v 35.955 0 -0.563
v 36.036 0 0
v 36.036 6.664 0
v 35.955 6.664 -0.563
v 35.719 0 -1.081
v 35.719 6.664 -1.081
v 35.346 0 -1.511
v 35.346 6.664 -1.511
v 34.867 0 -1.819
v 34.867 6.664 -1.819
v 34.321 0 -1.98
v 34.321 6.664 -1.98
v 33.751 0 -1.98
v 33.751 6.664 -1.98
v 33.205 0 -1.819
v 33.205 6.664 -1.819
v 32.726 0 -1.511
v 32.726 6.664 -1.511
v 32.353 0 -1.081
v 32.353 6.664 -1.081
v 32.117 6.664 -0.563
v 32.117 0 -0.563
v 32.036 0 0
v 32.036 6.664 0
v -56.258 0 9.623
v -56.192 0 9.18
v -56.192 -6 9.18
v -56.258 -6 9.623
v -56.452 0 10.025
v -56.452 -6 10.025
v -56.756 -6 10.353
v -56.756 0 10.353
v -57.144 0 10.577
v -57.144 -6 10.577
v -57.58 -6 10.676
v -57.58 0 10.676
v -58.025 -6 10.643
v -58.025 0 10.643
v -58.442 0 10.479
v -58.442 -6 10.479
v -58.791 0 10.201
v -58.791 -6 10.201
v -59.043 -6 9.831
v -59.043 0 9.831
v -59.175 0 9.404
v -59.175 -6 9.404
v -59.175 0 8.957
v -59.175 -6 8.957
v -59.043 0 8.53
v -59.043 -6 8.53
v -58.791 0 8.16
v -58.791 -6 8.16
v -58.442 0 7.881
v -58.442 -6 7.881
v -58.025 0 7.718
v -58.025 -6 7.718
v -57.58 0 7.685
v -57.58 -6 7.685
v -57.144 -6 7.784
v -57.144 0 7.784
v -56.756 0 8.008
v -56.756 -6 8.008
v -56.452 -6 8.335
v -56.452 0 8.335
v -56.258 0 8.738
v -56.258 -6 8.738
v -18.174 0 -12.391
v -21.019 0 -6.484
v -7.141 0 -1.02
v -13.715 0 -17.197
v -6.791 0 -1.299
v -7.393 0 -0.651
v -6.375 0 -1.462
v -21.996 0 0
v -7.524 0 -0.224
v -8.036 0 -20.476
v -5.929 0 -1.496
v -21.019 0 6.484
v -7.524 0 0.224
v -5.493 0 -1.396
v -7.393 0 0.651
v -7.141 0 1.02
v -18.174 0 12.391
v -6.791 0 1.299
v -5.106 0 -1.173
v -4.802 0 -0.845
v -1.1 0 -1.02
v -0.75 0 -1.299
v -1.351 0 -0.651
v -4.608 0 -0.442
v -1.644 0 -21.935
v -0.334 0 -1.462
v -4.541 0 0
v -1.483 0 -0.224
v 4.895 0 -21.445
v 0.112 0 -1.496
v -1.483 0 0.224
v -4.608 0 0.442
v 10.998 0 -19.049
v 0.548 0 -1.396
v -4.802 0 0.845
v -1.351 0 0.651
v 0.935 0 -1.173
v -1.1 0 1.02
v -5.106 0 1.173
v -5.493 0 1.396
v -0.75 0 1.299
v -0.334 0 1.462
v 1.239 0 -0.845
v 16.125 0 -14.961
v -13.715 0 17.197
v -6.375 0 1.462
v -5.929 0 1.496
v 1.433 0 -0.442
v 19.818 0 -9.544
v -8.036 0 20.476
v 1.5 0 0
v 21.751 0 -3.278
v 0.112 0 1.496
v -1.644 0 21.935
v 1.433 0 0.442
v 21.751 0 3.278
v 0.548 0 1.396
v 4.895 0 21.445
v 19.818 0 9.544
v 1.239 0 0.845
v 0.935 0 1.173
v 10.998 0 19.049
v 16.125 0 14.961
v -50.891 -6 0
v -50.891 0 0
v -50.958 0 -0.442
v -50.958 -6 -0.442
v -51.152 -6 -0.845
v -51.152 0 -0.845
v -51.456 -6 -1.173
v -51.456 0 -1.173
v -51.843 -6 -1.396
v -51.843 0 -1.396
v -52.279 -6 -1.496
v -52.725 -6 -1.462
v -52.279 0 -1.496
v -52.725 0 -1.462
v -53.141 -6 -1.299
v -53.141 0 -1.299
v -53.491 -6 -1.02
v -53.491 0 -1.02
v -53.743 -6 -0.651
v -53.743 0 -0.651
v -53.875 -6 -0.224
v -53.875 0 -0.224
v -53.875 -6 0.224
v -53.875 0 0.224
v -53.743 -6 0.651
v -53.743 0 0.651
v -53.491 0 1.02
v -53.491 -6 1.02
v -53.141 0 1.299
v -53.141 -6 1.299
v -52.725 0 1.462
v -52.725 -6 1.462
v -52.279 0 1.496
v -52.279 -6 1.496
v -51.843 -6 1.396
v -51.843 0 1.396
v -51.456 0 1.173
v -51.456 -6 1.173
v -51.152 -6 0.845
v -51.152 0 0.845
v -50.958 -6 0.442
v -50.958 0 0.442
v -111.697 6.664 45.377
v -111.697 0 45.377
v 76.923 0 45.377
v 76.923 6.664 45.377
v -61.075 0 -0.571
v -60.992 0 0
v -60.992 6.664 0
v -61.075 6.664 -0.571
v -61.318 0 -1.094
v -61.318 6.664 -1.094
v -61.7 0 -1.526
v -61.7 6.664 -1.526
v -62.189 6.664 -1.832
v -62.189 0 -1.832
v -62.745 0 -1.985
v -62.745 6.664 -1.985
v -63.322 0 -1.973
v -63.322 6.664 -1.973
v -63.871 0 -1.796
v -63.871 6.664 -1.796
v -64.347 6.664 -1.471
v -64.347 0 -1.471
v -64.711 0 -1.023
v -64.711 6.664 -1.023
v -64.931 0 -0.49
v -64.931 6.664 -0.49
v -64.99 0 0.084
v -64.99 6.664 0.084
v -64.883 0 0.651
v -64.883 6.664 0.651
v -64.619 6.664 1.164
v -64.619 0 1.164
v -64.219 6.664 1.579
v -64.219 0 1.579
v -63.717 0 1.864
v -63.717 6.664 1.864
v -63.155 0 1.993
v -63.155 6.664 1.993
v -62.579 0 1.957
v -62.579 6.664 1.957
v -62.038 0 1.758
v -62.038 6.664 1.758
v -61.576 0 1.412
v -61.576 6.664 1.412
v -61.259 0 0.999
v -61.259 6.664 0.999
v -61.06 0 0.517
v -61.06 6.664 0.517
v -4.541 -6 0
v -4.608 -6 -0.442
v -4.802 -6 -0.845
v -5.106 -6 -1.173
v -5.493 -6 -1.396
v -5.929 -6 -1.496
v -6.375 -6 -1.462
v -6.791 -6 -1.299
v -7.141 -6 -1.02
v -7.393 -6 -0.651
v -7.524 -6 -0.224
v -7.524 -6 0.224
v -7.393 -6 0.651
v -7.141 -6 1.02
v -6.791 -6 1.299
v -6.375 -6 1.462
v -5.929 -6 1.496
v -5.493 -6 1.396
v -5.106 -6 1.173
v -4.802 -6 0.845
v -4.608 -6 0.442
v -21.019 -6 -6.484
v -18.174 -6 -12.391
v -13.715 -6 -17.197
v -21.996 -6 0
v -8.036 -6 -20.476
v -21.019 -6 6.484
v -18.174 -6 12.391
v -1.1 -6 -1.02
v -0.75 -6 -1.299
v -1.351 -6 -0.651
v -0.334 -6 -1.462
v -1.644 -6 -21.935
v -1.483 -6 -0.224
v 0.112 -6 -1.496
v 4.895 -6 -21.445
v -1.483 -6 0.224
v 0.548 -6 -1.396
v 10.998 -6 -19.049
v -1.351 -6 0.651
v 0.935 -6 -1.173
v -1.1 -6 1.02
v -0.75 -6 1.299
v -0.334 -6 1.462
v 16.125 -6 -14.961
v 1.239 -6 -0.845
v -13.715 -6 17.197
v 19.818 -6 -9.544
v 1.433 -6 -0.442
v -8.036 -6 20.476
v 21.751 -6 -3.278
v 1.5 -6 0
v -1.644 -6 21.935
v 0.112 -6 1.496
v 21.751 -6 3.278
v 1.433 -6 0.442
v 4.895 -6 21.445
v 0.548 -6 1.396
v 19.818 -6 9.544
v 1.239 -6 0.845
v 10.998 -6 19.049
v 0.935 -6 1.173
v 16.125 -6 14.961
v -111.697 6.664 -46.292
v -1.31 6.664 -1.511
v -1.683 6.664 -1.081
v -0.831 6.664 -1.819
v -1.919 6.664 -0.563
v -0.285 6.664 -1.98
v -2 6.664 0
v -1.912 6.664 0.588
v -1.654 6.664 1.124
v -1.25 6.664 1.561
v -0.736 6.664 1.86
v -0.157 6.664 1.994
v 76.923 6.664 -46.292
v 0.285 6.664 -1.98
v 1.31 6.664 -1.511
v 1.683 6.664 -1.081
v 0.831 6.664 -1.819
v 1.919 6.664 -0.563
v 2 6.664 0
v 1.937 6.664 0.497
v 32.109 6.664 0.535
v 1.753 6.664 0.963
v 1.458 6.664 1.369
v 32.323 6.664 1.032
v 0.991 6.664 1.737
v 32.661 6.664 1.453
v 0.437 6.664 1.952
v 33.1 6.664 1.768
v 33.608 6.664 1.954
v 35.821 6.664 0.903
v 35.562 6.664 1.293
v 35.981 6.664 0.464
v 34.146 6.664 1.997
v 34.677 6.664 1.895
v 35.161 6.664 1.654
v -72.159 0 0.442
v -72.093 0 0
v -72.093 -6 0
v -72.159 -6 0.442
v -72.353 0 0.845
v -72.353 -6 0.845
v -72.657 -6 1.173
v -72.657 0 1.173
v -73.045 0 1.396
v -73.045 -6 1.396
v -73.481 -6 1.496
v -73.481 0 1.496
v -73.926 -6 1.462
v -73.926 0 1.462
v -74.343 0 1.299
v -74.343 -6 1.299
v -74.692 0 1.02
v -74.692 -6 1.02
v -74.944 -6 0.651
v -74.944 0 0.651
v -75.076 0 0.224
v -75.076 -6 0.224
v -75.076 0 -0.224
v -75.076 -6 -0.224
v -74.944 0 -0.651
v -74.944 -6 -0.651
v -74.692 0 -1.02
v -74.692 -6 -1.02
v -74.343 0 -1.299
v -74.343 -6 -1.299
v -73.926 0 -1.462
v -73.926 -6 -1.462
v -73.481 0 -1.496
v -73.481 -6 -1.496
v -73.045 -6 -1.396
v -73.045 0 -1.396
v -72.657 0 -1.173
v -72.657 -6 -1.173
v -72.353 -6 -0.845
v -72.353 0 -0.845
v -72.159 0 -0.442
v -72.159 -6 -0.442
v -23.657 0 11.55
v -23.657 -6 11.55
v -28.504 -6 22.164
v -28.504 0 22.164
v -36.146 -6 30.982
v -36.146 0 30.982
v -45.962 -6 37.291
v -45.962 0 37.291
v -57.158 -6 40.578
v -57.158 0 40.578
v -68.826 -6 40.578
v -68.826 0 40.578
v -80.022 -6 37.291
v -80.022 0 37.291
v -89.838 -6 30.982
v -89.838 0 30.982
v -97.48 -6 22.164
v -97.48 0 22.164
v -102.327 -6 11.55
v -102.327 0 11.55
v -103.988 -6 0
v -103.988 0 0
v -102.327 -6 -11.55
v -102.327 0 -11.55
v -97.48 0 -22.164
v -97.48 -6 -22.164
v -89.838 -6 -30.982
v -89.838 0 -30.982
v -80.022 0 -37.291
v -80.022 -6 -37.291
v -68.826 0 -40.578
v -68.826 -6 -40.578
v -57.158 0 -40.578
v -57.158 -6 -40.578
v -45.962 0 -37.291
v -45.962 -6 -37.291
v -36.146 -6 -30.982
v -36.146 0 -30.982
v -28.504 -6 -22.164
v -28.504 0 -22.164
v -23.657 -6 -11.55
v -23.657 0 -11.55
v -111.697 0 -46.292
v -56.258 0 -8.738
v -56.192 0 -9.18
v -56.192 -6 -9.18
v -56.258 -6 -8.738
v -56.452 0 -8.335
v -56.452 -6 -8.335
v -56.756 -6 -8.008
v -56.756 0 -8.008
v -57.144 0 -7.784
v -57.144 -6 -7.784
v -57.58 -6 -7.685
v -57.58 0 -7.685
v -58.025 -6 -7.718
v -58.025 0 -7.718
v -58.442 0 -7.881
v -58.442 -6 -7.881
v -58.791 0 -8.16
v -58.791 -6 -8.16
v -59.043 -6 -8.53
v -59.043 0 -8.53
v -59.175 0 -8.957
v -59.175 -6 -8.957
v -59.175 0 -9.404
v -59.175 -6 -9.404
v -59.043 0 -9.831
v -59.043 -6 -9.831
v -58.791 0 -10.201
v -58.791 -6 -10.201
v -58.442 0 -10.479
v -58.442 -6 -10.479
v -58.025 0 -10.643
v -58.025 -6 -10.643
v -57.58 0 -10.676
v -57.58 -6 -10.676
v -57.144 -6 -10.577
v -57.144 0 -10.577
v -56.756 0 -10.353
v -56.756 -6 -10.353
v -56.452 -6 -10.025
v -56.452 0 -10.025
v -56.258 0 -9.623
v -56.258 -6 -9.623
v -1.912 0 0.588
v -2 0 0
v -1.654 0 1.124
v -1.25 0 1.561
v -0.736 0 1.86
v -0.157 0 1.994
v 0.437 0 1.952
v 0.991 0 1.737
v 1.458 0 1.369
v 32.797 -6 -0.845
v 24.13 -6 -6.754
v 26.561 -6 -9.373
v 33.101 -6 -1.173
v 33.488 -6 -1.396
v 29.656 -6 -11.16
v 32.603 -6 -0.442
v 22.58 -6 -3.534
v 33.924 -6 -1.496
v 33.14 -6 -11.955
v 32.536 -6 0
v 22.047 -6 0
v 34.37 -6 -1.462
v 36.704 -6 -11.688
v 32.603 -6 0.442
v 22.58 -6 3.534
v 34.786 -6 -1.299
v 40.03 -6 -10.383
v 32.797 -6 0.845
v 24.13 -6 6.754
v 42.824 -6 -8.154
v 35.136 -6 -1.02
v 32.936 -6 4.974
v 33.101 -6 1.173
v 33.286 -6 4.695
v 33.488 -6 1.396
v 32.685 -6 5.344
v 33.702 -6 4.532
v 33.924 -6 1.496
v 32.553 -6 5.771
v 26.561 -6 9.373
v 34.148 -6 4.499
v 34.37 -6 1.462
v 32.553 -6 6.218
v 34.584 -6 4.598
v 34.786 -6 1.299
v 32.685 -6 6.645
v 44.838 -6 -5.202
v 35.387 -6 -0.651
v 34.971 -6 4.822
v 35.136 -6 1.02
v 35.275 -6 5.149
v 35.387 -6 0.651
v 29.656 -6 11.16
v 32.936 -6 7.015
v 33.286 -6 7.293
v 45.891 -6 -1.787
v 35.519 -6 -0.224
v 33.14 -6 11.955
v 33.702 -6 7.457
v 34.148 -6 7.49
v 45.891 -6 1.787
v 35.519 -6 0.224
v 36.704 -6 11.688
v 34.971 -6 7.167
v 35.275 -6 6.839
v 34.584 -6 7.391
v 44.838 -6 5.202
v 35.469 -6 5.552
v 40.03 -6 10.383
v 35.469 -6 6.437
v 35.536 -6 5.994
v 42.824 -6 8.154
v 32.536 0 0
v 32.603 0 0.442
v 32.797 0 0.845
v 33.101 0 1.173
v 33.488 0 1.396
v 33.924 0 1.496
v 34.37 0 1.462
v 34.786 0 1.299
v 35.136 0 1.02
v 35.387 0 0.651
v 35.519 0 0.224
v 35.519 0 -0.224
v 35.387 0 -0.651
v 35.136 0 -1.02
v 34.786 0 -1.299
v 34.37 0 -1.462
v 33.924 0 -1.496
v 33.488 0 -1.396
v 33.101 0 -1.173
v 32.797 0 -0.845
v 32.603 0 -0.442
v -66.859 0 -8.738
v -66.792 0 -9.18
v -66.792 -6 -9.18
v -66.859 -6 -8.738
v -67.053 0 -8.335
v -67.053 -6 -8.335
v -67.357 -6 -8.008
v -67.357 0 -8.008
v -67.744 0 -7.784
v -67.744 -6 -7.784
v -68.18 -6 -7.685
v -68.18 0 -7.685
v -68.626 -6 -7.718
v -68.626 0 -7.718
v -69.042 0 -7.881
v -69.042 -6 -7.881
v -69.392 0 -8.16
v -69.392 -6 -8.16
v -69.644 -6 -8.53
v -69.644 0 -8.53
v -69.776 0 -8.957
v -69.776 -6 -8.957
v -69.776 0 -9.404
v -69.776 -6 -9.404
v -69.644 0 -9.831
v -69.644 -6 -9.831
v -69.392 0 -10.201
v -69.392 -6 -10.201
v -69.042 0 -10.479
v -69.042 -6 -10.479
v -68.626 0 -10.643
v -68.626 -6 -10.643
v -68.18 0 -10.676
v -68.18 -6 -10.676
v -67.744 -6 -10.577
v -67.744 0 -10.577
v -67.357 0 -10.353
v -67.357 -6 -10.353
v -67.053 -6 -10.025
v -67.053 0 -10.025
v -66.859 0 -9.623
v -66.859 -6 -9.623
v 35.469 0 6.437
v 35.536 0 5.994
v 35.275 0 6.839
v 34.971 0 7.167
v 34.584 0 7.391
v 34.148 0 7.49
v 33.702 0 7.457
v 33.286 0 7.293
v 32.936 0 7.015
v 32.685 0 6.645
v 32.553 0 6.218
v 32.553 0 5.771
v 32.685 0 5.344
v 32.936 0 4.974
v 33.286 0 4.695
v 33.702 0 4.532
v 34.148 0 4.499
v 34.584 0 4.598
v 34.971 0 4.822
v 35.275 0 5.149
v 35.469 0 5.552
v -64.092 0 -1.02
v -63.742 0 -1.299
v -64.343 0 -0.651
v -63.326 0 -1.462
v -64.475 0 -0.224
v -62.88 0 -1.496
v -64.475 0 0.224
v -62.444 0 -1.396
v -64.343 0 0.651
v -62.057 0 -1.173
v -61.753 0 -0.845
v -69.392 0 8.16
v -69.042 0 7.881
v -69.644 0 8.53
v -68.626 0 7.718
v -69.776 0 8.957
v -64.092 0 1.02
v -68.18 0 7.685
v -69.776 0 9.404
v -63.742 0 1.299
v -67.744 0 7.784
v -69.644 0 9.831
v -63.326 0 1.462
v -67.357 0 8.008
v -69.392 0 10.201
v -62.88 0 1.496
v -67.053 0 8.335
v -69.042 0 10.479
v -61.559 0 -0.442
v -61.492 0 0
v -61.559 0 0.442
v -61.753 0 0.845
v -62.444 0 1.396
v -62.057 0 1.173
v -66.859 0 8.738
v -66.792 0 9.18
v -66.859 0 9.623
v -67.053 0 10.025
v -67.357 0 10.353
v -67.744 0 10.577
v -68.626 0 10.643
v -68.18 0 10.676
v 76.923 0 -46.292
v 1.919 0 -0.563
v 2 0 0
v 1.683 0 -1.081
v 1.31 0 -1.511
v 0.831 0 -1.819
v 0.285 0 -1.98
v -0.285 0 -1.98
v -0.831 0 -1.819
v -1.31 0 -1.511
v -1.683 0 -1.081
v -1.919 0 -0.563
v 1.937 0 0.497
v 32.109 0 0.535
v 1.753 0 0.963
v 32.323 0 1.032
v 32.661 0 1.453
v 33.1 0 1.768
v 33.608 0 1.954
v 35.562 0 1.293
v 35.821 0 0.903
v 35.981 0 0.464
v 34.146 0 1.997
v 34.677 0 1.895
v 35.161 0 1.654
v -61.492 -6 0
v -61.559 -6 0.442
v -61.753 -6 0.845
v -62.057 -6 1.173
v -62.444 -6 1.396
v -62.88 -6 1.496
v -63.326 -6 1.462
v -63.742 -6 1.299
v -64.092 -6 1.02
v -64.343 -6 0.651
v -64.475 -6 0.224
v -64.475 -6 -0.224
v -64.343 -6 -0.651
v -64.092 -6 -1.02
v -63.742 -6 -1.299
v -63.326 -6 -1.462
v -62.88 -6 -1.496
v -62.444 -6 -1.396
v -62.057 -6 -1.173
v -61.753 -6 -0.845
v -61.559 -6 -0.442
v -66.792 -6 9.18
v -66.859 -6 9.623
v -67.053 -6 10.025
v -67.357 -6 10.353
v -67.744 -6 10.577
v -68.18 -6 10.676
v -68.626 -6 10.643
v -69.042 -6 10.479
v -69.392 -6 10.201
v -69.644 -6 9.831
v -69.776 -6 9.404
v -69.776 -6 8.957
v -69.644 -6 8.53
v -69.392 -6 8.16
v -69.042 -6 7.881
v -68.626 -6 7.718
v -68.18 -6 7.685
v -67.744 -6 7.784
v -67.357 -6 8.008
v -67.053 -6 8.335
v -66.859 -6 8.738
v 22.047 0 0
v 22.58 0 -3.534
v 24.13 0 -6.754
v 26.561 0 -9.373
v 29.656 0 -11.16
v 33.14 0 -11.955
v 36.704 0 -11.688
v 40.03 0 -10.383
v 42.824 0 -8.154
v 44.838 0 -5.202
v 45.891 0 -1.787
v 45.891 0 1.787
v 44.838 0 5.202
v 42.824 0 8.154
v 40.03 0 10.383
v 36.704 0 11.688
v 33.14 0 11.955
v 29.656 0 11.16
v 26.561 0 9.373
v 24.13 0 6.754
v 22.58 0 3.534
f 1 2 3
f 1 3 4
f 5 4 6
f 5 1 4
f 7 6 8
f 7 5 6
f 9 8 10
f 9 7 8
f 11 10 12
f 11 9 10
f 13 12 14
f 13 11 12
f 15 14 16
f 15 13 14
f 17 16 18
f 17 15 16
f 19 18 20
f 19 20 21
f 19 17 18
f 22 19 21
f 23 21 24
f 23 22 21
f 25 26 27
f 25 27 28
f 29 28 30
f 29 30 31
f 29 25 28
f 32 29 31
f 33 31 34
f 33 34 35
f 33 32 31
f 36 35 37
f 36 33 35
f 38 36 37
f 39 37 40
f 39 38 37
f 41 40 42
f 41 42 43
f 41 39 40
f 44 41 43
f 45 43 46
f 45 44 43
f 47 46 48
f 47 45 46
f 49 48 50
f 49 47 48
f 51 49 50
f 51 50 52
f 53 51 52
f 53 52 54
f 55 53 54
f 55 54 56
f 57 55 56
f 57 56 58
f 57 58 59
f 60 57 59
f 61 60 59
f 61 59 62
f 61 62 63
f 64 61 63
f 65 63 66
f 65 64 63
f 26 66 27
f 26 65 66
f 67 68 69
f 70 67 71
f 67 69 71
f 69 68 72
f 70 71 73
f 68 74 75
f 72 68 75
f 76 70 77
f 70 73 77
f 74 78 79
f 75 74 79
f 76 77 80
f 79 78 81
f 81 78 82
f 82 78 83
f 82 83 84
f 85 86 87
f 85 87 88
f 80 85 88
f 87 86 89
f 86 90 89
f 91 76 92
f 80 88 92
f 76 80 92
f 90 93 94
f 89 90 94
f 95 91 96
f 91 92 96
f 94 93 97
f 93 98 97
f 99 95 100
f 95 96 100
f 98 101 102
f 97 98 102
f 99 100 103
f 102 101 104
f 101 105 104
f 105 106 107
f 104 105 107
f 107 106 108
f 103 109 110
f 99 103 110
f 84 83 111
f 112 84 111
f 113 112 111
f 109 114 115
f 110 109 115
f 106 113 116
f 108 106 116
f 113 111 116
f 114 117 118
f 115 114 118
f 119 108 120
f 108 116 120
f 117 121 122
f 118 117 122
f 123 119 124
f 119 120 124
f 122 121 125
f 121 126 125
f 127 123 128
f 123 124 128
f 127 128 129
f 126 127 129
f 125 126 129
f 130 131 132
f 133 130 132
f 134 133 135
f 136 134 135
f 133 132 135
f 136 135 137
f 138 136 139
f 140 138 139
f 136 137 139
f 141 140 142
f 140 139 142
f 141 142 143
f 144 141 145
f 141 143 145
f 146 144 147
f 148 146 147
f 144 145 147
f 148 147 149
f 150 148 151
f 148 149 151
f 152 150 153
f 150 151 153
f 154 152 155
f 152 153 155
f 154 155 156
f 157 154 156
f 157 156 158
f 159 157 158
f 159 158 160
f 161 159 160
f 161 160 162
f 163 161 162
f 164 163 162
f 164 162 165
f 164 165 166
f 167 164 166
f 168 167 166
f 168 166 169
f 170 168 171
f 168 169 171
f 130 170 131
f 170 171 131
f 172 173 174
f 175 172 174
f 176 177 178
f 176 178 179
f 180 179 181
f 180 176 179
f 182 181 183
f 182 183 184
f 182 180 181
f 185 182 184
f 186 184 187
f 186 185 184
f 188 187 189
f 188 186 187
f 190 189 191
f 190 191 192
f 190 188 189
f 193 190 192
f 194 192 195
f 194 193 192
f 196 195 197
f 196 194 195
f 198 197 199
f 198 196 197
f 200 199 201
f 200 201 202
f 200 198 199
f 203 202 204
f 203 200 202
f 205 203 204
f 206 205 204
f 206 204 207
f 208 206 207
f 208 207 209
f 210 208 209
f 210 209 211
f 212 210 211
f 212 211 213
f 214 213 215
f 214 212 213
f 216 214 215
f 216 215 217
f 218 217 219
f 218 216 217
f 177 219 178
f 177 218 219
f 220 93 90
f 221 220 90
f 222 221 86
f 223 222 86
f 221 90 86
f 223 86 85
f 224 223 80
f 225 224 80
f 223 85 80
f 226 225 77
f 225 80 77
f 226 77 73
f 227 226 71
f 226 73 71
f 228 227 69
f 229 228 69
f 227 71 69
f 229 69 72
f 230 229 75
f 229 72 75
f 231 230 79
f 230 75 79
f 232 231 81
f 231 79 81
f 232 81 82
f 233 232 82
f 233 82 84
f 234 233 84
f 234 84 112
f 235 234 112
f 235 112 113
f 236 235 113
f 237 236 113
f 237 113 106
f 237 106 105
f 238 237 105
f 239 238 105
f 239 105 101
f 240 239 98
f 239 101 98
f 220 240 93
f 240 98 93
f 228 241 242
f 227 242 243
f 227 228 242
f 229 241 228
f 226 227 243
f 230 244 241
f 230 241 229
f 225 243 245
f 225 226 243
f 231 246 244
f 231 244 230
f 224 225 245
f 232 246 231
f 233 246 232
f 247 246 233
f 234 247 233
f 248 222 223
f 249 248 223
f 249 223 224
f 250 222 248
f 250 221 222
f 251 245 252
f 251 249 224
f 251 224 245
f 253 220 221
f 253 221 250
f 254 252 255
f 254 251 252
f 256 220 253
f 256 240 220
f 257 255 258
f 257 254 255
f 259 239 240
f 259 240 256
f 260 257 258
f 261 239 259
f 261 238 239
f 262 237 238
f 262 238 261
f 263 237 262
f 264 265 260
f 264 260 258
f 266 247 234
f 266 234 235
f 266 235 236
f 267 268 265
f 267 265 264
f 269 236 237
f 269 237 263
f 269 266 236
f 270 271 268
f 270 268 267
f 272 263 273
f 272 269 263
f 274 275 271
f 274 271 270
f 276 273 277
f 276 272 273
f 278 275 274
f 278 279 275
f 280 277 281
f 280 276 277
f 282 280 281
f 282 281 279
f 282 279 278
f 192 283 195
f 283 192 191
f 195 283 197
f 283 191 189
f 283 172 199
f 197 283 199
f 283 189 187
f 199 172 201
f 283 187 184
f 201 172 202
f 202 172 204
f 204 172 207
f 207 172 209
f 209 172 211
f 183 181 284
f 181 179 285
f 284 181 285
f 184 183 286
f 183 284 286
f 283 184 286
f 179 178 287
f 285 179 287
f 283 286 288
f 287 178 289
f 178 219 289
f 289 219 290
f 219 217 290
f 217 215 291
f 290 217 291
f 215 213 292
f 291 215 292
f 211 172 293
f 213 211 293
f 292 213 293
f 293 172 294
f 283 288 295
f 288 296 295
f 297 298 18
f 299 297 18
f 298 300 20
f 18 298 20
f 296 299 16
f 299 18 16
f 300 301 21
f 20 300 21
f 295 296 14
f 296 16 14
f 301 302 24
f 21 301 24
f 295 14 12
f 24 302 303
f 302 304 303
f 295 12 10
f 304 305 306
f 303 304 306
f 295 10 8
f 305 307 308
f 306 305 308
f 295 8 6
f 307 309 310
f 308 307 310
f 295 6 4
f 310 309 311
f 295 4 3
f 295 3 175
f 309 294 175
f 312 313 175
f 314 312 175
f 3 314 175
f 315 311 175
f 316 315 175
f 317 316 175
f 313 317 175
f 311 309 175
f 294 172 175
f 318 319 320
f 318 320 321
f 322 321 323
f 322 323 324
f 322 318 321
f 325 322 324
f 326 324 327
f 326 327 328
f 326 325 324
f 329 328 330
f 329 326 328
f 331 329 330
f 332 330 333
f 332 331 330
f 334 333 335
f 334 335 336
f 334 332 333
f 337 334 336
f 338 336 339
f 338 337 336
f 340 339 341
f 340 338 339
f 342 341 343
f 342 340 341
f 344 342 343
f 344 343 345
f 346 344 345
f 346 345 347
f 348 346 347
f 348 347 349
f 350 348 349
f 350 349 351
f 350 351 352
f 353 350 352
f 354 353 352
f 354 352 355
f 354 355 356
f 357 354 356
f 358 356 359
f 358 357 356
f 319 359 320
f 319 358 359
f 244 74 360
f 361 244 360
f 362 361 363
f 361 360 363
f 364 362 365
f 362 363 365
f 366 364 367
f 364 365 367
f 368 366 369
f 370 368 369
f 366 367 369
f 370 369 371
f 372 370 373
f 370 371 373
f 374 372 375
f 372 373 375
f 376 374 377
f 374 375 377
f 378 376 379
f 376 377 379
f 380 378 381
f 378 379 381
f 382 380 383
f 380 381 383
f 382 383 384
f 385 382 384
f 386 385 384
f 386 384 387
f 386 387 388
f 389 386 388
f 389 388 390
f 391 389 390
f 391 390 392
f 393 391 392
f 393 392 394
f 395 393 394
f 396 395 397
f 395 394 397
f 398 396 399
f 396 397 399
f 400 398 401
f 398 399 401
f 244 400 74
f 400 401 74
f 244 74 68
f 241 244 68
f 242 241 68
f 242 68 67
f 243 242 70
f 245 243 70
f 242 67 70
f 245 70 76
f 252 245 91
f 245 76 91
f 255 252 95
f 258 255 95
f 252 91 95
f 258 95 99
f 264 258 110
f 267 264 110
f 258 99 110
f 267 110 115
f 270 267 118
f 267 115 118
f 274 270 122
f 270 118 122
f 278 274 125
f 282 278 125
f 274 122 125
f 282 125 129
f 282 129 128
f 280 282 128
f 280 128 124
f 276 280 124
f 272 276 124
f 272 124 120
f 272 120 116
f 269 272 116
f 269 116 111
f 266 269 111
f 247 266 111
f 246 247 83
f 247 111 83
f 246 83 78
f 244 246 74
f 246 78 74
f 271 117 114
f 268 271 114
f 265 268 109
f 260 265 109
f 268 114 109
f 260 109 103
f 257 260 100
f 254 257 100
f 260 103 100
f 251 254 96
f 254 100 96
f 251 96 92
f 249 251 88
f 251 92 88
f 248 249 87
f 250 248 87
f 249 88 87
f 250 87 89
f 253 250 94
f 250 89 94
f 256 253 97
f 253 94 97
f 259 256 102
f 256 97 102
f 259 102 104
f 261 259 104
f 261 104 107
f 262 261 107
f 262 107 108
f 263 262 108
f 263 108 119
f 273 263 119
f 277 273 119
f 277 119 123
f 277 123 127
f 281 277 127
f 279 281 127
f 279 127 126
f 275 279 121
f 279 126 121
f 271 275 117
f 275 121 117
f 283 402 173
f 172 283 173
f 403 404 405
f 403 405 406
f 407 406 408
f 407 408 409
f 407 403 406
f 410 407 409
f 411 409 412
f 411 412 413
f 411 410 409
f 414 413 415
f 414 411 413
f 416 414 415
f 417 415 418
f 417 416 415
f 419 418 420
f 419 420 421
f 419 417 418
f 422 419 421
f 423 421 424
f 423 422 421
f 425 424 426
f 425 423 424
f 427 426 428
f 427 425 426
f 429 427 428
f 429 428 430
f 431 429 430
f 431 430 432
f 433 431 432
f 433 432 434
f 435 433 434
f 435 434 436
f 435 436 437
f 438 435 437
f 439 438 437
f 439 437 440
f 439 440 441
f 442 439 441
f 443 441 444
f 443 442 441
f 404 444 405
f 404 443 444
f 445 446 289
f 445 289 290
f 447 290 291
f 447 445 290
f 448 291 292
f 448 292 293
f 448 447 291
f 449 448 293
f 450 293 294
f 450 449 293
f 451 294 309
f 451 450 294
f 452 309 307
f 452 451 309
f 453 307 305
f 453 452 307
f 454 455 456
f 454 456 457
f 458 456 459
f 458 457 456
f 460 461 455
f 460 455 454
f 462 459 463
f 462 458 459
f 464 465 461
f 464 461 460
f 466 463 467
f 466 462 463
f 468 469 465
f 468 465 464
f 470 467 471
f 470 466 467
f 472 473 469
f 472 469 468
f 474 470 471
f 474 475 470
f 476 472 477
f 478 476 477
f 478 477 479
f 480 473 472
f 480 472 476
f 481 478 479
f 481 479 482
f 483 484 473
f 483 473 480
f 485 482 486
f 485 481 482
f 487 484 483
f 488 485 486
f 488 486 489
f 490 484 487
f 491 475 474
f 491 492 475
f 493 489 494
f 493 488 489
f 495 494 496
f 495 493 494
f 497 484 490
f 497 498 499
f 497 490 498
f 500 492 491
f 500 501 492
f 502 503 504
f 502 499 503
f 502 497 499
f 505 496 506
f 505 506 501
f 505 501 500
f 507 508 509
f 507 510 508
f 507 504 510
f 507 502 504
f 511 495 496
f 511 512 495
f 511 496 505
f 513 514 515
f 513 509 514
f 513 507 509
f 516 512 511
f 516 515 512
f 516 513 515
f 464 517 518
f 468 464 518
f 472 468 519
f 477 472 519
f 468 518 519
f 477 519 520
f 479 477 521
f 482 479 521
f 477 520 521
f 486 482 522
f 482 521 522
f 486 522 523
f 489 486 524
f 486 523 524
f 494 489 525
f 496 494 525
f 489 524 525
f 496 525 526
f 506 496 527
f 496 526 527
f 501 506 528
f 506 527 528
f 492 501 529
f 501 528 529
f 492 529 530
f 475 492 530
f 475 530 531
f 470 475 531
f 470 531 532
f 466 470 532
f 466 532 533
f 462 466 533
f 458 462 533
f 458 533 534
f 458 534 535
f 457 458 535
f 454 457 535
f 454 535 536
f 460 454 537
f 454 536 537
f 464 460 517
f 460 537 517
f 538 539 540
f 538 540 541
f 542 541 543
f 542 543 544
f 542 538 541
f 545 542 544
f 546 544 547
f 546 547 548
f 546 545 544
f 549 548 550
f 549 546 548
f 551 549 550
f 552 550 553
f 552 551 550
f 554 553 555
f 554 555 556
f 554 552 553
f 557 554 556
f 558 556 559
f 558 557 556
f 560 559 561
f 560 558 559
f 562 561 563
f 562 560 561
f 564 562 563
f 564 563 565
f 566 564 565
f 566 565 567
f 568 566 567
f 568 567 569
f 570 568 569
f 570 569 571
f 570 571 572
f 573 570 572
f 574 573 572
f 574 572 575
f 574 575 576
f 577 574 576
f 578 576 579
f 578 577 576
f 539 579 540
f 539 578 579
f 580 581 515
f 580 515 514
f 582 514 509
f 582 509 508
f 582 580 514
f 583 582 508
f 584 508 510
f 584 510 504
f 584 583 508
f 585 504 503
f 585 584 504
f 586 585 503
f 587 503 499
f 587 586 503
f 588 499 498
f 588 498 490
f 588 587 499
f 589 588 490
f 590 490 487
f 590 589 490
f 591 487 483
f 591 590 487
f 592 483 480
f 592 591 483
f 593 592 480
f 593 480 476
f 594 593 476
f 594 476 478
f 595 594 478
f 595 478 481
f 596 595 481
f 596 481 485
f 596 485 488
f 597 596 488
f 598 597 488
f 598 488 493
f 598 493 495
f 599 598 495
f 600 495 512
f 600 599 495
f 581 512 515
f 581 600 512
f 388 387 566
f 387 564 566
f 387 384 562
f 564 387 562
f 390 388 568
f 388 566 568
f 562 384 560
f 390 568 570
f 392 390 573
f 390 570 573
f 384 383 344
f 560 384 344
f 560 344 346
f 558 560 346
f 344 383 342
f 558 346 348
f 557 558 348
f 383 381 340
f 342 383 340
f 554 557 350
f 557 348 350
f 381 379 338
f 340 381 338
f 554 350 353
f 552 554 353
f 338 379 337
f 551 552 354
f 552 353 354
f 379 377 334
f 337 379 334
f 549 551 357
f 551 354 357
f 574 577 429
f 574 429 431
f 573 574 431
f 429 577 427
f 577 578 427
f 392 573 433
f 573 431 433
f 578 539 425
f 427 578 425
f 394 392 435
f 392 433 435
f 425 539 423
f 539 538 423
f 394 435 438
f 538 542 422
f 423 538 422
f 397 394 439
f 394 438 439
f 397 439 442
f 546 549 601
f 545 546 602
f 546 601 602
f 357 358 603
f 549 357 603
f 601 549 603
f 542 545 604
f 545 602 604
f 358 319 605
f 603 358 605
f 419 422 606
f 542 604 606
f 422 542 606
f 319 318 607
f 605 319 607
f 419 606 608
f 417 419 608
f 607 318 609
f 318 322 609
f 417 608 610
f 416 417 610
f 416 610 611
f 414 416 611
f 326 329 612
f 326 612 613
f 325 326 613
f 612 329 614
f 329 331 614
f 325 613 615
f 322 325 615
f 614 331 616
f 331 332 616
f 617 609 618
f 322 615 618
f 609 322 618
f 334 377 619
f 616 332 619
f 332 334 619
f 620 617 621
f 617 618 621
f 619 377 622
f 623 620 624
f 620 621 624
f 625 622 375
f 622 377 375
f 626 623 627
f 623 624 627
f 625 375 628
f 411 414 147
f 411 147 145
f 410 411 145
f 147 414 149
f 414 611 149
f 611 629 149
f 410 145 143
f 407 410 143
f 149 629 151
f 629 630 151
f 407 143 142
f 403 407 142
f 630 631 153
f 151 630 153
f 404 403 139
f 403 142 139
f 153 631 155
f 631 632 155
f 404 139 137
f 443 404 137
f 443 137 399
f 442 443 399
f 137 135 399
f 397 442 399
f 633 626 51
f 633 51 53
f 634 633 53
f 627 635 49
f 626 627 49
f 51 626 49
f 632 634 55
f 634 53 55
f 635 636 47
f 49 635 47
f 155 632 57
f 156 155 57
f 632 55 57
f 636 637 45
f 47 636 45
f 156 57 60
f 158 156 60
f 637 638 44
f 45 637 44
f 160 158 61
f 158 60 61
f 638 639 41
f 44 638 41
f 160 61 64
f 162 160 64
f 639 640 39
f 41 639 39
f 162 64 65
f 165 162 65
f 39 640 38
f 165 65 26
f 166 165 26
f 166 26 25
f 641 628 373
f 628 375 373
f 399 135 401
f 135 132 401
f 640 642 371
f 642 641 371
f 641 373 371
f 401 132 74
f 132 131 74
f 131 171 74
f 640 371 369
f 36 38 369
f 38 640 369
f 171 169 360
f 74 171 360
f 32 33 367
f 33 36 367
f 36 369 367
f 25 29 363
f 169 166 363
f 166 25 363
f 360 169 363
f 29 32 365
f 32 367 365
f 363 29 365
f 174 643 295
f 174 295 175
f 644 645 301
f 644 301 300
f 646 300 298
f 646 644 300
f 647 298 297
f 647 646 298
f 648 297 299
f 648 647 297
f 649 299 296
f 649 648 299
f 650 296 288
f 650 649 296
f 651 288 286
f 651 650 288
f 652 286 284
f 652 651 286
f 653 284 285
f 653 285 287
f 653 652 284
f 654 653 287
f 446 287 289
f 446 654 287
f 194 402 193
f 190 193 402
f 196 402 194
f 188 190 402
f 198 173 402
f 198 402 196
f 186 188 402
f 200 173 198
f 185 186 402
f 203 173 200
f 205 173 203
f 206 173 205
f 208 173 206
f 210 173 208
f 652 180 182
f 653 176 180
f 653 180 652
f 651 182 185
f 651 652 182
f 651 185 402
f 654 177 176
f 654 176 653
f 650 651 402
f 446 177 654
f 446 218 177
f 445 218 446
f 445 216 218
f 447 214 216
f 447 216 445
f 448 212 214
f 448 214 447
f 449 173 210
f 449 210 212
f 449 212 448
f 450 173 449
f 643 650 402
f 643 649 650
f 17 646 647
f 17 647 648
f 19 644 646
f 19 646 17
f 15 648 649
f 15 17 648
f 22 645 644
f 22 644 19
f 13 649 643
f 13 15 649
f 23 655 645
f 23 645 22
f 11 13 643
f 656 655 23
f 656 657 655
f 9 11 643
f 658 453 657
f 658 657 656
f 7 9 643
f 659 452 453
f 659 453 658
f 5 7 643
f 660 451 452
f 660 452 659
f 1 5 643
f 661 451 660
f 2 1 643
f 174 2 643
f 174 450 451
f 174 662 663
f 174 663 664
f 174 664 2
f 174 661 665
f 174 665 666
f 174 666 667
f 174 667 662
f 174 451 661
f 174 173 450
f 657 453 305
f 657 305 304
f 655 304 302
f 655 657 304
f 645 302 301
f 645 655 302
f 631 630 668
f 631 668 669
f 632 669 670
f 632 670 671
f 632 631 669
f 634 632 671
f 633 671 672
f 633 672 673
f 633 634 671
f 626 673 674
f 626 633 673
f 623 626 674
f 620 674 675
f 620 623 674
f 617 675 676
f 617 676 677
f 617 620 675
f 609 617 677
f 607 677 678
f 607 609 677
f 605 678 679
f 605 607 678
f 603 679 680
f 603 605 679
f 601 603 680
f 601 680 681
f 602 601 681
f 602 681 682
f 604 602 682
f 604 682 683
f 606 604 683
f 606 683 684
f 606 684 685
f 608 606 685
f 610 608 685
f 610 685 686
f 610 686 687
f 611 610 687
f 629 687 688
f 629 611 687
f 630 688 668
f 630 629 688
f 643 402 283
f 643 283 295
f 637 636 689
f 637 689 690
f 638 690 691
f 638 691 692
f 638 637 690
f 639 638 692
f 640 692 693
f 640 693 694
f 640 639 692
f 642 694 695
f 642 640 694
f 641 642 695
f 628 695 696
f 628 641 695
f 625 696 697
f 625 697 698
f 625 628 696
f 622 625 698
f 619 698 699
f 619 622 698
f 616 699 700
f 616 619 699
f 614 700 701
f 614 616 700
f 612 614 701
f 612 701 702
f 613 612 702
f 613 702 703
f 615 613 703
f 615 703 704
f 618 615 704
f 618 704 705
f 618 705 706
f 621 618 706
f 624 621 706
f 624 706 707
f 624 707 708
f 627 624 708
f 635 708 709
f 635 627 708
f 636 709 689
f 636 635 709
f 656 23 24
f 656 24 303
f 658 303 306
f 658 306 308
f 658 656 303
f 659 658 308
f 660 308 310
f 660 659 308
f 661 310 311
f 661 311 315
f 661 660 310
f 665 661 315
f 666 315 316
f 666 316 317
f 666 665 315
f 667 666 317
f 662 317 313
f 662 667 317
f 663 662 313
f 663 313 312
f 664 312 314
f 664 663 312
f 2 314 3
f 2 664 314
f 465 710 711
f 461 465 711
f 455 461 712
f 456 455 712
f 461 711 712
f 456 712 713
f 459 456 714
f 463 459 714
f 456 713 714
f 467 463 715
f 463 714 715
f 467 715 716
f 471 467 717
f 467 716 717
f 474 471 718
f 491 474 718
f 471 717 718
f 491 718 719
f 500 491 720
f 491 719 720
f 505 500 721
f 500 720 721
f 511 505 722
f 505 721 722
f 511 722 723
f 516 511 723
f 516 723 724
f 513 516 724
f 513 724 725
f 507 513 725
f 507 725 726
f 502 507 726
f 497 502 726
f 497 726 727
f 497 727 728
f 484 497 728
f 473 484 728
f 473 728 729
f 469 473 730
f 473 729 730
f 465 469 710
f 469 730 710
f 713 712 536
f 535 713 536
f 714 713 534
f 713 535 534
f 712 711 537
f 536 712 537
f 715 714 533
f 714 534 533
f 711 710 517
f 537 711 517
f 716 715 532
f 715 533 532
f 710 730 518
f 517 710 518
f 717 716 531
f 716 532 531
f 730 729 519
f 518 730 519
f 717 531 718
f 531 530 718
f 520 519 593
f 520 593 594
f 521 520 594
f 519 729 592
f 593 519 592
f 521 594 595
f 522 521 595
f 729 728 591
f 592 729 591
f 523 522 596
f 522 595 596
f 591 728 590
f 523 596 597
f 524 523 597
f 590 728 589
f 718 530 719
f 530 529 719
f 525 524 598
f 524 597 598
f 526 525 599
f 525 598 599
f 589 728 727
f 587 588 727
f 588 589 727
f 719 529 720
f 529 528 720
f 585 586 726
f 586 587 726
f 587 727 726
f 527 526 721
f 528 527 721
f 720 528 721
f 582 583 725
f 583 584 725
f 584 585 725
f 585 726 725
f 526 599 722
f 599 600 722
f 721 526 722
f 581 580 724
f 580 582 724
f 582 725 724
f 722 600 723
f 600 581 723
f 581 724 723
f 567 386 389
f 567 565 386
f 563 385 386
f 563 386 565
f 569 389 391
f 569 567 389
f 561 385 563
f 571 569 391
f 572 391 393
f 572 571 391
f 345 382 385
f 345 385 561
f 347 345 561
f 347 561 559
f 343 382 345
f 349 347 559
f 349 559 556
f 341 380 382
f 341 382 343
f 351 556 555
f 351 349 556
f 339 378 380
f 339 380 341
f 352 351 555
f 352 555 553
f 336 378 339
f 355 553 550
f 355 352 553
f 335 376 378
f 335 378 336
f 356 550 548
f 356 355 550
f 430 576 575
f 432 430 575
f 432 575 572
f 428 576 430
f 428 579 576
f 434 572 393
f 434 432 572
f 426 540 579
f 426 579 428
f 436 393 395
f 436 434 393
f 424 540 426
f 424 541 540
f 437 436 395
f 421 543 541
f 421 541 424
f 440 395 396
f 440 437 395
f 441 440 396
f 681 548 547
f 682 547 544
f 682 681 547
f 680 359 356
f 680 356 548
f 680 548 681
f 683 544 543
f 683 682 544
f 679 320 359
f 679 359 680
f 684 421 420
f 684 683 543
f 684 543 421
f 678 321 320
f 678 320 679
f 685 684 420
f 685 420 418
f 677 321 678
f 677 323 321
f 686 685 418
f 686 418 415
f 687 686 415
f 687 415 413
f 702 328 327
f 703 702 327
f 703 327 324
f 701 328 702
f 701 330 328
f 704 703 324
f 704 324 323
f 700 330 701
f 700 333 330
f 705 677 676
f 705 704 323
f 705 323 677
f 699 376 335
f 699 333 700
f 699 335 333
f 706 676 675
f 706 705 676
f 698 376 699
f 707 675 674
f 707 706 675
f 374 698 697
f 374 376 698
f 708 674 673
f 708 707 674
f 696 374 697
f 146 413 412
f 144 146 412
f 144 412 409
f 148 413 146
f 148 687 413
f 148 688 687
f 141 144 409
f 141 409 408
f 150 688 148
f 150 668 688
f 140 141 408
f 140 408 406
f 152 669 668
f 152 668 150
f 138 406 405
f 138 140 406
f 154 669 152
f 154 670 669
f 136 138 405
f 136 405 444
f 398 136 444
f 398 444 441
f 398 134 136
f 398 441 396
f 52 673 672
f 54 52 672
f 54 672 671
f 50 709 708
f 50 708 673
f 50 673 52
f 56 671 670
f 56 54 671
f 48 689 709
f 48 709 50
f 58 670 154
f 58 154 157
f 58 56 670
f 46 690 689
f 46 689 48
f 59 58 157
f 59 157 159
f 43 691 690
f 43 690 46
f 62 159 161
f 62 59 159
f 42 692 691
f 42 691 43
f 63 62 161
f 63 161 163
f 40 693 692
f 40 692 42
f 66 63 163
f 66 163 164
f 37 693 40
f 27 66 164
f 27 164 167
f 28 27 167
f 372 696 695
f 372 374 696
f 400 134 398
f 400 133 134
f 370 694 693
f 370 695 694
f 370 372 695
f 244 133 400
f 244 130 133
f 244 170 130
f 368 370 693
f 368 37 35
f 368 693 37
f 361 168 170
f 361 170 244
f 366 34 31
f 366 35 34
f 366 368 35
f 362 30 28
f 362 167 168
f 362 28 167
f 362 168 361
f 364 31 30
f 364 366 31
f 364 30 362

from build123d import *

# Parameters (mm, degrees)
F0_R     = 40.9956
F0_R_2   = 1.5
F1_DEPTH = 6
F2_W     = 188.6204481125
F2_H     = 91.6689150035
F3_DEPTH = 6.66401


with BuildPart() as f1:
    # F0 (on Front) → F1 (new body)
    with BuildSketch(Plane.XZ):
        with Locations((-62.992, 0)):
            Circle(F0_R)
        with Locations((-68.2923400796, -9.1804582301)):
            Circle(F0_R_2, mode=Mode.SUBTRACT)
        with Locations((-57.6916599868, -9.1804582684)):
            Circle(F0_R_2, mode=Mode.SUBTRACT)
        with BuildLine():
            ThreePointArc((-53.8913199146, 0), (-52.3913199018, 1.4999999745), (-50.8913199146, -2.55e-08))
            ThreePointArc((-50.8913199146, -2.55e-08), (-52.3913199274, -1.5000000255), (-53.8913199146, 0))
        make_face(mode=Mode.SUBTRACT)
        with Locations((-73.5926800854, 0)):
            Circle(F0_R_2, mode=Mode.SUBTRACT)
        with Locations((-68.2923400353, 9.1804582556)):
            Circle(F0_R_2, mode=Mode.SUBTRACT)
        with Locations((-62.992, 0)):
            Circle(F0_R_2, mode=Mode.SUBTRACT)
        with Locations((-57.6916599425, 9.1804582428)):
            Circle(F0_R_2, mode=Mode.SUBTRACT)
    extrude(amount=F1_DEPTH)


with BuildPart() as f1b:
    # F0 (on Front) → F1, piece 2 (new body)
    with BuildSketch(Plane.XZ):
        with BuildLine():
            Line((1.5, 0), (21.9964, 0))
            ThreePointArc((21.9964, 0), (0, 21.9964), (-21.9964, 0))
            Line((-21.9964, 0), (-7.5411840677, 0))
            ThreePointArc((-7.5411840677, 0), (-6.0411840677, 1.5), (-4.5411840677, 0))
            Line((-4.5411840677, 0), (-1.5, 0))
            ThreePointArc((-1.5, 0), (0, 1.5), (1.5, 0))
        make_face()
        with BuildLine():
            ThreePointArc((-21.9964, 0), (0, -21.9964), (21.9964, 0))
            Line((21.9964, 0), (1.5, 0))
            ThreePointArc((1.5, 0), (0, -1.5), (-1.5, 0))
            Line((-1.5, 0), (-4.5411840677, 0))
            ThreePointArc((-4.5411840677, 0), (-6.0411840677, -1.5), (-7.5411840677, 0))
            Line((-7.5411840677, 0), (-21.9964, 0))
        make_face()
    extrude(amount=F1_DEPTH)


with BuildPart() as f1c:
    # F0 (on Front) → F1, piece 3 (new body)
    with BuildSketch(Plane.XZ):
        with BuildLine():
            ThreePointArc((46.0248, 0), (34.036, 11.9888), (22.0472, 0))
            ThreePointArc((22.0472, 0), (34.036, -11.9888), (46.0248, 0))
        make_face()
        with BuildLine():
            ThreePointArc((35.536, 0), (34.036, -1.5), (32.536, 0))
            ThreePointArc((32.536, 0), (34.036, 1.5), (35.536, 0))
        make_face(mode=Mode.SUBTRACT)
        with Locations((34.036, 5.9944)):
            Circle(F0_R_2, mode=Mode.SUBTRACT)
    extrude(amount=F1_DEPTH)


with BuildPart() as f3:
    # F2 (on Front) → F3 (new body)
    with BuildSketch(Plane.XZ):
        with Locations((-17.3867791891, -0.4575978965)):
            Rectangle(F2_W, F2_H)
        with BuildLine():
            ThreePointArc((-61.5760172269, 1.4124421355), (-61.143762252, 0.7642101981), (-60.992, 0))
            ThreePointArc((-60.992, 0), (-64.840237748, -0.7642101981), (-61.5760172269, 1.4124421355))
        make_face(mode=Mode.SUBTRACT)
        with BuildLine():
            ThreePointArc((2, 0), (0, -2), (-2, 0))
            ThreePointArc((-2, 0), (-0.7359938163, 1.8596540276), (1.4583131024, 1.3686938648))
            ThreePointArc((1.4583131024, 1.3686938648), (1.8596540276, 0.7359938163), (2, 0))
        make_face(mode=Mode.SUBTRACT)
        with BuildLine():
            ThreePointArc((36.036, 0), (34.036, -2), (32.036, 0))
            ThreePointArc((32.036, 0), (33.3476831661, 1.8778231909), (35.5622199361, 1.2925373134))
            ThreePointArc((35.5622199361, 1.2925373134), (35.9138231909, 0.6883168339), (36.036, 0))
        make_face(mode=Mode.SUBTRACT)
    extrude(amount=-F3_DEPTH)


solid = Compound([f1.part, f1b.part, f1c.part, f3.part])
